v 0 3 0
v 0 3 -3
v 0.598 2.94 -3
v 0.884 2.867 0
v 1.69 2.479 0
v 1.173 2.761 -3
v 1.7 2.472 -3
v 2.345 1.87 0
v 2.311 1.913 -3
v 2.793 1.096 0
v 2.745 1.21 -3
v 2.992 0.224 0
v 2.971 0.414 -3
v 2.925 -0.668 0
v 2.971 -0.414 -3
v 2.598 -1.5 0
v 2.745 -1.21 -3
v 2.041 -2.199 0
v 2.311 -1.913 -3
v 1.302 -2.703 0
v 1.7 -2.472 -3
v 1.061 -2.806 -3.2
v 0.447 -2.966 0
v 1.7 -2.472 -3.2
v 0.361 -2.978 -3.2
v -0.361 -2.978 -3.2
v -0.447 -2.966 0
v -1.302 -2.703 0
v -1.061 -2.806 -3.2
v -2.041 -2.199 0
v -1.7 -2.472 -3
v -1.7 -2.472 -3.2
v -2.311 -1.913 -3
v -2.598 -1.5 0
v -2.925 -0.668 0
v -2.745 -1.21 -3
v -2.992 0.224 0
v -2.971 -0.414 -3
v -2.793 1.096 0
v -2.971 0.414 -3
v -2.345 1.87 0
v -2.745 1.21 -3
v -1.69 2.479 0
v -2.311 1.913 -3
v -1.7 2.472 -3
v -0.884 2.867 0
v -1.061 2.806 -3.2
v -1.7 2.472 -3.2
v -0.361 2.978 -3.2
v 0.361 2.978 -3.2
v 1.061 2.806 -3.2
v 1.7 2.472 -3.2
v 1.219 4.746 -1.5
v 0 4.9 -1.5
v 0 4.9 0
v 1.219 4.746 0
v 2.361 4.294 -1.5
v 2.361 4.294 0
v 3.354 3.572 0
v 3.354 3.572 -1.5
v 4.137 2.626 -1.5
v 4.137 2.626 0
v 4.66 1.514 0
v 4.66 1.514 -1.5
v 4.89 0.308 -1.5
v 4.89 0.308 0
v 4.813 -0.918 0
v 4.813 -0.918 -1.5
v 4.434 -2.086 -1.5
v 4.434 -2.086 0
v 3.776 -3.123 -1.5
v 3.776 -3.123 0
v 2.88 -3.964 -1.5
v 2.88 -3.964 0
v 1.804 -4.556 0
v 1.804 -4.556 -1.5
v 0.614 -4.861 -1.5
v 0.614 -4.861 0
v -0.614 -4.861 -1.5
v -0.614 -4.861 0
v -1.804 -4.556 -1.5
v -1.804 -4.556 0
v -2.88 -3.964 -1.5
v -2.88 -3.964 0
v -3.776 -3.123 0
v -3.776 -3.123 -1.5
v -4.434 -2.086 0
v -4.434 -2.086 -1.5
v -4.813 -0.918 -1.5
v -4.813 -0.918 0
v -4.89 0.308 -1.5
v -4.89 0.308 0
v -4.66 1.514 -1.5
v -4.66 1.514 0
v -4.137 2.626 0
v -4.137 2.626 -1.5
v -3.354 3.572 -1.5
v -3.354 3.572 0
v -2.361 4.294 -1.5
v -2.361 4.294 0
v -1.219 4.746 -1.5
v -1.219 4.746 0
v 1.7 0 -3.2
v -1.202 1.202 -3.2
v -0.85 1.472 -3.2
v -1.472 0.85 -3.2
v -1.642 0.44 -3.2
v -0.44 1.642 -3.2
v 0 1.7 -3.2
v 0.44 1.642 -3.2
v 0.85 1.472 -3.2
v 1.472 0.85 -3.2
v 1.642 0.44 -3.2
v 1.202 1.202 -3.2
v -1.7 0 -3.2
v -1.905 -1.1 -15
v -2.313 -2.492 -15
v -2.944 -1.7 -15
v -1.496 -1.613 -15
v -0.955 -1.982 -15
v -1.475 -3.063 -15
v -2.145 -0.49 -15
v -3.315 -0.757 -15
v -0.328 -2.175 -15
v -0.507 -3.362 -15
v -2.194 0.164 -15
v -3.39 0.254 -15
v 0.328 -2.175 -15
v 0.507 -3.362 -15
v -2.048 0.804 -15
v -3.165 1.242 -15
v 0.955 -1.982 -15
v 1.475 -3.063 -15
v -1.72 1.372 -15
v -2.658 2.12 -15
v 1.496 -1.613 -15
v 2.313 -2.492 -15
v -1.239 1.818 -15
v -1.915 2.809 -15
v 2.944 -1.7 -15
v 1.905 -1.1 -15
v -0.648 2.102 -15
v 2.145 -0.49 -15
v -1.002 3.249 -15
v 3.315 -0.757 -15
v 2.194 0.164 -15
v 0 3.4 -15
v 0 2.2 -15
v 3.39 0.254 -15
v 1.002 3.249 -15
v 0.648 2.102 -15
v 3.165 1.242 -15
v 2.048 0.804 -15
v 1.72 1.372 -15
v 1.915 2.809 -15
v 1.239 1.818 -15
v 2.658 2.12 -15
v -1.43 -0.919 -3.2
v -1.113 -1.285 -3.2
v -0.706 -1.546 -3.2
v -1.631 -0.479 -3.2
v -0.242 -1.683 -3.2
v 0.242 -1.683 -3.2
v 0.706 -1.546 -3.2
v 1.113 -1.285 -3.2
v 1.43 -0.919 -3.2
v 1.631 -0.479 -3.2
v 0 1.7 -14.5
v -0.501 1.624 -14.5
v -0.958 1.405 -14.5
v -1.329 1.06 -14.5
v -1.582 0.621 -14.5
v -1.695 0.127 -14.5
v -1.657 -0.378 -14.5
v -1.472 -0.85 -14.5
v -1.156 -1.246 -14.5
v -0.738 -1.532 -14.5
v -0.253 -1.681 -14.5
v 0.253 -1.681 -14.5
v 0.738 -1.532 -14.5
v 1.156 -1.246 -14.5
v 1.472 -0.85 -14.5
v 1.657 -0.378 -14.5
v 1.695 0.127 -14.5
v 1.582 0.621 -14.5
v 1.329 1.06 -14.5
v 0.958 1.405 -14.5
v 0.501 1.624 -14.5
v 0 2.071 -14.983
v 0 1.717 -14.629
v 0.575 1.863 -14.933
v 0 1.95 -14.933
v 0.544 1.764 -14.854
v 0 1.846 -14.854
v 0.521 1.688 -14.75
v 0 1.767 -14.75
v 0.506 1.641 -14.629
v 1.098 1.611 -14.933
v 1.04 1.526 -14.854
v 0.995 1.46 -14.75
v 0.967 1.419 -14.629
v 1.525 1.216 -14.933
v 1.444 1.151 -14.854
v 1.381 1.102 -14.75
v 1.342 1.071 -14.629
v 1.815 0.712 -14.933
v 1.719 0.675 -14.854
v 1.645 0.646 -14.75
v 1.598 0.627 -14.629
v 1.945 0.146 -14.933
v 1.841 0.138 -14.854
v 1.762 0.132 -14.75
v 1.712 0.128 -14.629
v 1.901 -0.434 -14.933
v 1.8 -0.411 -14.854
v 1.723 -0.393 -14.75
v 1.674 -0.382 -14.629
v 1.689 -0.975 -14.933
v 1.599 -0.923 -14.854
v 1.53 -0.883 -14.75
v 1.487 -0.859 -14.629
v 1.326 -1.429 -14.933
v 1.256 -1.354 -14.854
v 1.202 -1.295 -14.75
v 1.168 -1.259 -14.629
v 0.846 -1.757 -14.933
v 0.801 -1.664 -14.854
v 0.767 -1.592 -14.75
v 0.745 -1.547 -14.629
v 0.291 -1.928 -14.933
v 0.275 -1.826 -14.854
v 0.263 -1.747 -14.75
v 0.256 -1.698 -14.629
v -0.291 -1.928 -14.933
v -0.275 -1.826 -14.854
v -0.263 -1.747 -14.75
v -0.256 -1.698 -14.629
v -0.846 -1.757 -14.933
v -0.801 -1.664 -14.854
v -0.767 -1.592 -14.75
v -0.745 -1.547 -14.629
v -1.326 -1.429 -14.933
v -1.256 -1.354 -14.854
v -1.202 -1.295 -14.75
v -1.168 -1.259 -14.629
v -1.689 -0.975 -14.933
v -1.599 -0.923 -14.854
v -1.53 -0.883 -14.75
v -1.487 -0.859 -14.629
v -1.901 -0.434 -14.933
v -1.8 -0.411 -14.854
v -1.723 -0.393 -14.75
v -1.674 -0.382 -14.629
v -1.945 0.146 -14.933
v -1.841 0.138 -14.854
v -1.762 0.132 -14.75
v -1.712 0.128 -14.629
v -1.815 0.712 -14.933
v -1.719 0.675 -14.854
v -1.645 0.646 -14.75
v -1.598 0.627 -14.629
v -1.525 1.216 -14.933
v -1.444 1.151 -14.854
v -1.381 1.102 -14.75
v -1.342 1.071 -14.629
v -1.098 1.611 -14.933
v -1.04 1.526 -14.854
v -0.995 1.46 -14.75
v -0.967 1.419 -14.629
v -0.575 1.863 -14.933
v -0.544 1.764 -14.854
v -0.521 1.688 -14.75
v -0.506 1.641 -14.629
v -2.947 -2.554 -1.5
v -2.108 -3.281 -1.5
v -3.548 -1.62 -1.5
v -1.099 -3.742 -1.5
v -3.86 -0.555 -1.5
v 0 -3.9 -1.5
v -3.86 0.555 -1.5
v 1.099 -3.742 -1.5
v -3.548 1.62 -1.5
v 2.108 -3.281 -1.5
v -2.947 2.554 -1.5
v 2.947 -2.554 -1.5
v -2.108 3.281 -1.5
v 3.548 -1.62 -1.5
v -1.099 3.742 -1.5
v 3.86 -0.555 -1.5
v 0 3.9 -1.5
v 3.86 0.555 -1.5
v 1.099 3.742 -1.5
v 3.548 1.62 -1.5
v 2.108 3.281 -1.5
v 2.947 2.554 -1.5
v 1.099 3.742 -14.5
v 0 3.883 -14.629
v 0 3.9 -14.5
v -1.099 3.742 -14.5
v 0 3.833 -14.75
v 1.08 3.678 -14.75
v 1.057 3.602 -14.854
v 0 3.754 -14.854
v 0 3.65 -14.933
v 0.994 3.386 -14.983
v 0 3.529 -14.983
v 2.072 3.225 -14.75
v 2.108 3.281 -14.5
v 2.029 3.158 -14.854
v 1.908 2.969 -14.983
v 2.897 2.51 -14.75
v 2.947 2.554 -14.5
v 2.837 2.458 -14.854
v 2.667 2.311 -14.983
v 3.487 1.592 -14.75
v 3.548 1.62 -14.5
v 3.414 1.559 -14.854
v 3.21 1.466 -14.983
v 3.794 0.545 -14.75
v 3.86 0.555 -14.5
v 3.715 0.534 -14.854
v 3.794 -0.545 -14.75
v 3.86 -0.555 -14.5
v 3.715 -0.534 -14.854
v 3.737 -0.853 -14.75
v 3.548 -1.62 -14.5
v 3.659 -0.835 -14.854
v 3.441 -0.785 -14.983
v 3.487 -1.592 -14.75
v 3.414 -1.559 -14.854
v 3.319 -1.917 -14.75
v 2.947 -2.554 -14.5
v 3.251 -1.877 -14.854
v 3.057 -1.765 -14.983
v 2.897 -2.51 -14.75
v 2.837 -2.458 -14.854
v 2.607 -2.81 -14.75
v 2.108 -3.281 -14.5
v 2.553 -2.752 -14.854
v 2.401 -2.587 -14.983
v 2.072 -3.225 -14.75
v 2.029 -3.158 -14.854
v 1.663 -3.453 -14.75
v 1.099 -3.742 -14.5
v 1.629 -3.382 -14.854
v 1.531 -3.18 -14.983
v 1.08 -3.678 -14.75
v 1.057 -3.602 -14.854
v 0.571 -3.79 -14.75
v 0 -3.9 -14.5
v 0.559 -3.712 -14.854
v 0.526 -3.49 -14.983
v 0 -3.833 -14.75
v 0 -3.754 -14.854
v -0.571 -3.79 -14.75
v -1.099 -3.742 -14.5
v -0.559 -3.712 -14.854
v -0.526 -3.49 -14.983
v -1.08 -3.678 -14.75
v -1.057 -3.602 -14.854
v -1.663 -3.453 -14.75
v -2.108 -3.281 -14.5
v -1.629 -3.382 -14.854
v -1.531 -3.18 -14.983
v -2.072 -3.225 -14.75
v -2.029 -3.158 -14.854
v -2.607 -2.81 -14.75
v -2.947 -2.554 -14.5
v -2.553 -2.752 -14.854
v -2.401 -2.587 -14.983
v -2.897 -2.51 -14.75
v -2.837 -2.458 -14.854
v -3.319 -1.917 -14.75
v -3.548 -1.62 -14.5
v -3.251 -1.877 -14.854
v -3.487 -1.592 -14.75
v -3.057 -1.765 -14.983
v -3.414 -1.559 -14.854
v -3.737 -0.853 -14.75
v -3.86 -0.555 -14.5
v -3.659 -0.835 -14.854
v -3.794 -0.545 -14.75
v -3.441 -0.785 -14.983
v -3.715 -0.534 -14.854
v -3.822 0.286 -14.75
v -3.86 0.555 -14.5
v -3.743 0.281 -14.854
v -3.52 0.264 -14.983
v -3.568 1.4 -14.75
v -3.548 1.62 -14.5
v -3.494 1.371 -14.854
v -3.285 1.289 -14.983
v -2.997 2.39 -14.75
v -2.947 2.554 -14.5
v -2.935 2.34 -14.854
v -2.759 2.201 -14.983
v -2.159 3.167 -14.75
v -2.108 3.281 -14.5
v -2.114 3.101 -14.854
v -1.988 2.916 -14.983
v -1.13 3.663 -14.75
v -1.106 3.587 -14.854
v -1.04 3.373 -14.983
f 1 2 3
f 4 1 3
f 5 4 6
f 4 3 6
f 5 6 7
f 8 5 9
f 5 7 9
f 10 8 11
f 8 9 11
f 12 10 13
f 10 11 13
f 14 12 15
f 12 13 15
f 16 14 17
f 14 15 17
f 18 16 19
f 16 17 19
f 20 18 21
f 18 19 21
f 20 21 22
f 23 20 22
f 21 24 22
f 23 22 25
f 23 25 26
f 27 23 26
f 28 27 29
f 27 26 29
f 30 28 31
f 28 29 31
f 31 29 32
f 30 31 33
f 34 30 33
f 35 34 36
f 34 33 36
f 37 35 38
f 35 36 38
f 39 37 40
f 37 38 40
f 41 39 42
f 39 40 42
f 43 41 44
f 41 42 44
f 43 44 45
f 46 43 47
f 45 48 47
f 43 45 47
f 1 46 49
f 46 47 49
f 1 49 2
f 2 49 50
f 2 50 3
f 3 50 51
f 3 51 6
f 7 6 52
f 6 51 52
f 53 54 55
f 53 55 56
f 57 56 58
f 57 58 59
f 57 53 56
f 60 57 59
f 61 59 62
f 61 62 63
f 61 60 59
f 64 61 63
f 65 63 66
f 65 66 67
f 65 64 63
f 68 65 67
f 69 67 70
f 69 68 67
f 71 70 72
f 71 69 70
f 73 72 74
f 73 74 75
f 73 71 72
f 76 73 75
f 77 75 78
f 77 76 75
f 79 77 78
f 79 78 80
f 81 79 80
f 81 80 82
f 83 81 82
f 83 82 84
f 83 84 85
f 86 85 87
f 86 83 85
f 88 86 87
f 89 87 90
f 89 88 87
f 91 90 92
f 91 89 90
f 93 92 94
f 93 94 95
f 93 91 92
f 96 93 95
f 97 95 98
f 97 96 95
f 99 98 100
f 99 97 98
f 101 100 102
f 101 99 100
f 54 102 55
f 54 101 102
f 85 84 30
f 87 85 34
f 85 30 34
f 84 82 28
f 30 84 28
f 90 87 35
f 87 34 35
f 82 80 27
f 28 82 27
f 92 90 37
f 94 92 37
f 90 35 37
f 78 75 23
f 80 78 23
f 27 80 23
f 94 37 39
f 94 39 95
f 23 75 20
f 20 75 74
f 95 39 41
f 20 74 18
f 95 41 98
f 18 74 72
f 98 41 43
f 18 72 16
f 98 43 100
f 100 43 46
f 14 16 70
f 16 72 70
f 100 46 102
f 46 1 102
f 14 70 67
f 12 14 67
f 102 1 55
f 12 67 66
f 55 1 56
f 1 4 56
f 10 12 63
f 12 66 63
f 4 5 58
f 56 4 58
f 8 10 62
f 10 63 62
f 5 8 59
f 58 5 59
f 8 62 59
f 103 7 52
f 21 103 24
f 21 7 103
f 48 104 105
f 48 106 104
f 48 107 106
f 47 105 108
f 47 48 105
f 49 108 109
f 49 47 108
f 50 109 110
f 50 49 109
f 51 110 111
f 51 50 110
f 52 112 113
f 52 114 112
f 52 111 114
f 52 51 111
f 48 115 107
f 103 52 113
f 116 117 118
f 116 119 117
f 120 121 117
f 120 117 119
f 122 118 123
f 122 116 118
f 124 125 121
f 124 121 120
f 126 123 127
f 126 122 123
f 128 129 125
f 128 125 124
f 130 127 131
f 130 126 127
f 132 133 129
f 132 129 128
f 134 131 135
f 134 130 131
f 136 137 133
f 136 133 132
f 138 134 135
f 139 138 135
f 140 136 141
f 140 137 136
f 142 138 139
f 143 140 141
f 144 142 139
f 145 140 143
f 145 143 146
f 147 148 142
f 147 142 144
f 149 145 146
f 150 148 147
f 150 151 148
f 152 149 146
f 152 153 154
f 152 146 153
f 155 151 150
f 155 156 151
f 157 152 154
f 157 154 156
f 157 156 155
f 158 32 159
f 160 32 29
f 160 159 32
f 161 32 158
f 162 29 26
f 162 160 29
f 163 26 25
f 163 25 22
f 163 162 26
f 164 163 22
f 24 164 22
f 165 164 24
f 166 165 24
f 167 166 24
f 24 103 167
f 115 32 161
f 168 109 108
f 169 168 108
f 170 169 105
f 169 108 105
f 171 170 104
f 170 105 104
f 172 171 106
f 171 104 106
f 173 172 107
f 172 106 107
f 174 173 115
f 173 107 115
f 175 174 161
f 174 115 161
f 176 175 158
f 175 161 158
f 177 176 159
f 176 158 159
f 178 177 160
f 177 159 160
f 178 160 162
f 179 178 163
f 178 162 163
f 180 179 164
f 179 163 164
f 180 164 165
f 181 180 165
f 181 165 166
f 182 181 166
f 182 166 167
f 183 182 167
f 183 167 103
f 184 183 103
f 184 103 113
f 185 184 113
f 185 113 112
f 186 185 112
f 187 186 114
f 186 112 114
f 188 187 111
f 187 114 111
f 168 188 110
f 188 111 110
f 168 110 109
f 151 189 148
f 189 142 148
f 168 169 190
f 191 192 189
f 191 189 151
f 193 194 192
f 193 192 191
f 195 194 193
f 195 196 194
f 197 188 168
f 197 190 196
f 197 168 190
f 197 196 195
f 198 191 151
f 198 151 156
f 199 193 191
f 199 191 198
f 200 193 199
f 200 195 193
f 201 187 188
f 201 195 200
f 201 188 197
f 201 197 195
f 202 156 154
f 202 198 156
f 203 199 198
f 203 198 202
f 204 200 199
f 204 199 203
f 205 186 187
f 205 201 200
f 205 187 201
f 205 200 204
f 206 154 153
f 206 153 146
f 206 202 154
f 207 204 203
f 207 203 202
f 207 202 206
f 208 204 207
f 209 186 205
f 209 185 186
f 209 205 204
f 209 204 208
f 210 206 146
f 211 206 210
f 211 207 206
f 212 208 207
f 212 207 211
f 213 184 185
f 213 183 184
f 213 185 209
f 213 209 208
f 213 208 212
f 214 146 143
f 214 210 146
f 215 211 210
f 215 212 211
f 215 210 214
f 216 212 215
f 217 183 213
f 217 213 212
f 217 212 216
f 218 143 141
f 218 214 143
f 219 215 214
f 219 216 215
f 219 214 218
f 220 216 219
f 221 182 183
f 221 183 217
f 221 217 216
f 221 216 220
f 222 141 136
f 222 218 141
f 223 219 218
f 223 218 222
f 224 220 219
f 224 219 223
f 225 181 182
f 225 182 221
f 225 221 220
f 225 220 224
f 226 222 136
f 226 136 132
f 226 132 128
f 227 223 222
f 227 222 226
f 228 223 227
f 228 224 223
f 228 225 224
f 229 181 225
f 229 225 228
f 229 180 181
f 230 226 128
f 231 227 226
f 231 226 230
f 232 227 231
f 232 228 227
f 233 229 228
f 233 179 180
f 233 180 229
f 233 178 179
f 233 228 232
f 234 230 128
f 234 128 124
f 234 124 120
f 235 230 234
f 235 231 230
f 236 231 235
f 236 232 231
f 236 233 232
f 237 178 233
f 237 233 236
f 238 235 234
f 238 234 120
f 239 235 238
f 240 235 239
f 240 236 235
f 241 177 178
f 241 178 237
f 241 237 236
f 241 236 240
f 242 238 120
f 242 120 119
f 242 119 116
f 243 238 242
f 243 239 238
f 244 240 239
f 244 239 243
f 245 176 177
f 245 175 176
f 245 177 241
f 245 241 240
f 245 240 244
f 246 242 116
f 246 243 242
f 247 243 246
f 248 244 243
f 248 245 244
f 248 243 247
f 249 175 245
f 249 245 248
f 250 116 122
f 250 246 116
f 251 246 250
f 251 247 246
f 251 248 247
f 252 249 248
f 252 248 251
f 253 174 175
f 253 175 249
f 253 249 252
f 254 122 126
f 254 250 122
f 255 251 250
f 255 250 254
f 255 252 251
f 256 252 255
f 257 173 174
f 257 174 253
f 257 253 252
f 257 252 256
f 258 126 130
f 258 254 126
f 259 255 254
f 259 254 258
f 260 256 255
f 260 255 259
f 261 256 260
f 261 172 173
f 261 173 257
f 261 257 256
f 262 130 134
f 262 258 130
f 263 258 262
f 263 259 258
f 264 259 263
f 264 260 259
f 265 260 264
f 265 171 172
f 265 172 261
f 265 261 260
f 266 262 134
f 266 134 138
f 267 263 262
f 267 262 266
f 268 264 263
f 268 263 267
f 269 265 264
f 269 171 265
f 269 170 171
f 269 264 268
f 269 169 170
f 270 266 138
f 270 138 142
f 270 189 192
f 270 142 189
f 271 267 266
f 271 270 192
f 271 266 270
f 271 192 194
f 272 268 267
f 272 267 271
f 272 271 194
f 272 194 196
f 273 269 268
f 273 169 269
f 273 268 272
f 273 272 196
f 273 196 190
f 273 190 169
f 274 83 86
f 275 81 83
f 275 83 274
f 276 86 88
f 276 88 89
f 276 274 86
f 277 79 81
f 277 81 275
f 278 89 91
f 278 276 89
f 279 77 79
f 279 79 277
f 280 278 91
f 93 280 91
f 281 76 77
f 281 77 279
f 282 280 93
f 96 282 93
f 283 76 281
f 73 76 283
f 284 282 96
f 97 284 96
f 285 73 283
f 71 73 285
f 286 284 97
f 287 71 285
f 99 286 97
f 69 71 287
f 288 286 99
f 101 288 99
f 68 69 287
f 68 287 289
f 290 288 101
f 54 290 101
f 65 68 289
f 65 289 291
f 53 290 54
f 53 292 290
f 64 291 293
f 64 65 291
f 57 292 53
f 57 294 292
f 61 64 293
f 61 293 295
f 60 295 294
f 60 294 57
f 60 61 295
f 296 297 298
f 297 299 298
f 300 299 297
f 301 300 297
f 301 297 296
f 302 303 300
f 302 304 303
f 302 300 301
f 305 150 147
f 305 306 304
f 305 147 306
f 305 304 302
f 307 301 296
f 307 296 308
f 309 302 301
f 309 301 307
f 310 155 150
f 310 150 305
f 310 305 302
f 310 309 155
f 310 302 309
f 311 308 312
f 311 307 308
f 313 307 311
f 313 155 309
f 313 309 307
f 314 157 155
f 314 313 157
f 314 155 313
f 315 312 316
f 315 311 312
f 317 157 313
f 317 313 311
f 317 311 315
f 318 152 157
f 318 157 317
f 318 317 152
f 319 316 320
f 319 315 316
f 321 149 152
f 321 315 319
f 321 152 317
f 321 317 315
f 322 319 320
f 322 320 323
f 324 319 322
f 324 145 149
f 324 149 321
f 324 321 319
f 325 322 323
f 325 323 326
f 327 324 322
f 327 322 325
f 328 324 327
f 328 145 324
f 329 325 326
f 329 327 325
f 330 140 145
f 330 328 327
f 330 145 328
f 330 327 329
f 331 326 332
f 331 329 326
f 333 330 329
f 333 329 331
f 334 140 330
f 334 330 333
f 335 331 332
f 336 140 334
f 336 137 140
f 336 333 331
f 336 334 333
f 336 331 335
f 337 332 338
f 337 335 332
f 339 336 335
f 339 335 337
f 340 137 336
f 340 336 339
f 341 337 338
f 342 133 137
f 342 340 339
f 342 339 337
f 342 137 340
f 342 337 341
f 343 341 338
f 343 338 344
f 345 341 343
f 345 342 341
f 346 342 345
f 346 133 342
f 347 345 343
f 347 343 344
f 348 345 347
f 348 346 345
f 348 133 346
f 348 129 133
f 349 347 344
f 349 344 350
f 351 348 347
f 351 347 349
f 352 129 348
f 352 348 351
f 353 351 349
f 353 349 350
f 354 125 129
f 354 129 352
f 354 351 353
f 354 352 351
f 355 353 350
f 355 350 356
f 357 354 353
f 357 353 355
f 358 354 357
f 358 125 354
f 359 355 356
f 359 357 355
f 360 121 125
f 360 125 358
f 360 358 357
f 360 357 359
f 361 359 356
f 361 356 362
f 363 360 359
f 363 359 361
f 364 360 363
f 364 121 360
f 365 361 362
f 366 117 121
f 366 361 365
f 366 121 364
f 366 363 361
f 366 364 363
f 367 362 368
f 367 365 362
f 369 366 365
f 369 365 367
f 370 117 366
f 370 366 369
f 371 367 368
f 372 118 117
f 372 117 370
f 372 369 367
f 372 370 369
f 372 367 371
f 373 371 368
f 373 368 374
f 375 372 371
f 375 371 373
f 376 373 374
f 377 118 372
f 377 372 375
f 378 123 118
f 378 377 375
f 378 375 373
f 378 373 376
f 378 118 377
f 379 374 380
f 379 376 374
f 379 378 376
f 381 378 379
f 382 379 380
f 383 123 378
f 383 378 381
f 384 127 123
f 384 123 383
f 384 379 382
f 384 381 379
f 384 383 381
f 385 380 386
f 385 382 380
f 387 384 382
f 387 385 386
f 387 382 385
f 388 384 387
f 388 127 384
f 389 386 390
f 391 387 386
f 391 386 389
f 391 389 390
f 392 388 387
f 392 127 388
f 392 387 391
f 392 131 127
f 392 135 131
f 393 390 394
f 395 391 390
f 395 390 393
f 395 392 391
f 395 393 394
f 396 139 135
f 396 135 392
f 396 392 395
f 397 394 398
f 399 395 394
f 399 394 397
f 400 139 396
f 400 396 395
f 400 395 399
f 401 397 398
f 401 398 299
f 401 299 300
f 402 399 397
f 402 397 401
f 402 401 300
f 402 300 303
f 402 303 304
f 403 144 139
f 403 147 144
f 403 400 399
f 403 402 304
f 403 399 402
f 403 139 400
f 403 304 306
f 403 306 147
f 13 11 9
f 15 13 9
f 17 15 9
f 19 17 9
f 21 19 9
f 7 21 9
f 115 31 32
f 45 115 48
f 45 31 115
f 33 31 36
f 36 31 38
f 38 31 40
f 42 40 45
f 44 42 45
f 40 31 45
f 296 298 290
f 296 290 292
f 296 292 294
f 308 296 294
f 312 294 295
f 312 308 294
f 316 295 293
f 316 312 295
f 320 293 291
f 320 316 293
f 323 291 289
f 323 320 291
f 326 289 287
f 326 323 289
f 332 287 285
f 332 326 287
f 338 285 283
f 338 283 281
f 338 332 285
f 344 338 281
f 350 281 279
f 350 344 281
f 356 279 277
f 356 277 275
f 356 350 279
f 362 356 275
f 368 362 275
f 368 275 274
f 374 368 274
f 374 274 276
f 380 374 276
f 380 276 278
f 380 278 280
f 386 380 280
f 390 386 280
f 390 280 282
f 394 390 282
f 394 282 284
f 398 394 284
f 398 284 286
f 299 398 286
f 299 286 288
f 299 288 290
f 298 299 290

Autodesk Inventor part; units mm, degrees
ref_plane "YZ Plane" through (0, 0, 0) normal (1, 0, 0) x (0, 1, 0)
ref_plane "XZ Plane" through (0, 0, 0) normal (0, 1, 0) x (-1, 0, 0)
ref_plane "XY Plane" through (0, 0, 0) normal (0, 0, 1) x (1, 0, 0)
sketch "Sketch1" plane through (0, 0, 0) normal (1, 0, 0) x (0, 1, 0)
  line L0 (0, 0) -> (1.65, 0) construction
  line L1 (1.65, 0) -> (3, 0) construction
  line L2 (4.9, 0) -> (4.9, -1.5)
  line L3 (4.9, -1.5) -> (3.9, -1.5)
  line L4 (3.9, -1.5) -> (3.9, -15)
  line L5 (3.9, -15) -> (1.7, -15)
  line L6 (1.7, -15) -> (1.7, -3)
  line L7 (0, 0) -> (0, -13.7466) construction
  line L8 (3, 0) -> (3, -3)
  line L9 (3, -3) -> (1.7, -3)
  line L10 (3, 0) -> (4.9, 0)
  dimension "d0" = 1.7
  dimension "d1" = 3.9
  dimension "d2" = 1
  dimension "d3" = 1.5
  dimension "d4" = 13.5
  dimension "d6" = 3
  dimension "d7" = 3
revolve "Revolution1" add sketch "Sketch1" angle 360 about axis through (0, 0, 0) along (0, 0, -1)
fillet "Fillet1" radius 0.5 2 edges at (0, -1.7, -15) (0, -3.9, -15)
sketch "Sketch2" plane through (0, 0, -3) normal (0, 0, 1) x (1, 0, 0)
  circle A0 centre (0, 0) radius 3 projected
  line L0 (-1.7, 2.4718) -> (1.7, 2.4718) construction
  line L1 (1.7, 2.4718) -> (1.7, -2.4718)
  line L2 (1.7, -2.4718) -> (-1.7, -2.4718) construction
  line L3 (-1.7, -2.4718) -> (-1.7, 2.4718)
  circle A1 centre (0, 0) radius 1.7 projected
  point P0 (-1.7, 0)
  point P1 (1.7, 0)
extrude "Extrusion1" cut sketch "Sketch2" against normal blind 0.2 contours L1 A1 L3 A0 | A0 L3 A1 L1
properties part number "HD_BearingShaft2"
